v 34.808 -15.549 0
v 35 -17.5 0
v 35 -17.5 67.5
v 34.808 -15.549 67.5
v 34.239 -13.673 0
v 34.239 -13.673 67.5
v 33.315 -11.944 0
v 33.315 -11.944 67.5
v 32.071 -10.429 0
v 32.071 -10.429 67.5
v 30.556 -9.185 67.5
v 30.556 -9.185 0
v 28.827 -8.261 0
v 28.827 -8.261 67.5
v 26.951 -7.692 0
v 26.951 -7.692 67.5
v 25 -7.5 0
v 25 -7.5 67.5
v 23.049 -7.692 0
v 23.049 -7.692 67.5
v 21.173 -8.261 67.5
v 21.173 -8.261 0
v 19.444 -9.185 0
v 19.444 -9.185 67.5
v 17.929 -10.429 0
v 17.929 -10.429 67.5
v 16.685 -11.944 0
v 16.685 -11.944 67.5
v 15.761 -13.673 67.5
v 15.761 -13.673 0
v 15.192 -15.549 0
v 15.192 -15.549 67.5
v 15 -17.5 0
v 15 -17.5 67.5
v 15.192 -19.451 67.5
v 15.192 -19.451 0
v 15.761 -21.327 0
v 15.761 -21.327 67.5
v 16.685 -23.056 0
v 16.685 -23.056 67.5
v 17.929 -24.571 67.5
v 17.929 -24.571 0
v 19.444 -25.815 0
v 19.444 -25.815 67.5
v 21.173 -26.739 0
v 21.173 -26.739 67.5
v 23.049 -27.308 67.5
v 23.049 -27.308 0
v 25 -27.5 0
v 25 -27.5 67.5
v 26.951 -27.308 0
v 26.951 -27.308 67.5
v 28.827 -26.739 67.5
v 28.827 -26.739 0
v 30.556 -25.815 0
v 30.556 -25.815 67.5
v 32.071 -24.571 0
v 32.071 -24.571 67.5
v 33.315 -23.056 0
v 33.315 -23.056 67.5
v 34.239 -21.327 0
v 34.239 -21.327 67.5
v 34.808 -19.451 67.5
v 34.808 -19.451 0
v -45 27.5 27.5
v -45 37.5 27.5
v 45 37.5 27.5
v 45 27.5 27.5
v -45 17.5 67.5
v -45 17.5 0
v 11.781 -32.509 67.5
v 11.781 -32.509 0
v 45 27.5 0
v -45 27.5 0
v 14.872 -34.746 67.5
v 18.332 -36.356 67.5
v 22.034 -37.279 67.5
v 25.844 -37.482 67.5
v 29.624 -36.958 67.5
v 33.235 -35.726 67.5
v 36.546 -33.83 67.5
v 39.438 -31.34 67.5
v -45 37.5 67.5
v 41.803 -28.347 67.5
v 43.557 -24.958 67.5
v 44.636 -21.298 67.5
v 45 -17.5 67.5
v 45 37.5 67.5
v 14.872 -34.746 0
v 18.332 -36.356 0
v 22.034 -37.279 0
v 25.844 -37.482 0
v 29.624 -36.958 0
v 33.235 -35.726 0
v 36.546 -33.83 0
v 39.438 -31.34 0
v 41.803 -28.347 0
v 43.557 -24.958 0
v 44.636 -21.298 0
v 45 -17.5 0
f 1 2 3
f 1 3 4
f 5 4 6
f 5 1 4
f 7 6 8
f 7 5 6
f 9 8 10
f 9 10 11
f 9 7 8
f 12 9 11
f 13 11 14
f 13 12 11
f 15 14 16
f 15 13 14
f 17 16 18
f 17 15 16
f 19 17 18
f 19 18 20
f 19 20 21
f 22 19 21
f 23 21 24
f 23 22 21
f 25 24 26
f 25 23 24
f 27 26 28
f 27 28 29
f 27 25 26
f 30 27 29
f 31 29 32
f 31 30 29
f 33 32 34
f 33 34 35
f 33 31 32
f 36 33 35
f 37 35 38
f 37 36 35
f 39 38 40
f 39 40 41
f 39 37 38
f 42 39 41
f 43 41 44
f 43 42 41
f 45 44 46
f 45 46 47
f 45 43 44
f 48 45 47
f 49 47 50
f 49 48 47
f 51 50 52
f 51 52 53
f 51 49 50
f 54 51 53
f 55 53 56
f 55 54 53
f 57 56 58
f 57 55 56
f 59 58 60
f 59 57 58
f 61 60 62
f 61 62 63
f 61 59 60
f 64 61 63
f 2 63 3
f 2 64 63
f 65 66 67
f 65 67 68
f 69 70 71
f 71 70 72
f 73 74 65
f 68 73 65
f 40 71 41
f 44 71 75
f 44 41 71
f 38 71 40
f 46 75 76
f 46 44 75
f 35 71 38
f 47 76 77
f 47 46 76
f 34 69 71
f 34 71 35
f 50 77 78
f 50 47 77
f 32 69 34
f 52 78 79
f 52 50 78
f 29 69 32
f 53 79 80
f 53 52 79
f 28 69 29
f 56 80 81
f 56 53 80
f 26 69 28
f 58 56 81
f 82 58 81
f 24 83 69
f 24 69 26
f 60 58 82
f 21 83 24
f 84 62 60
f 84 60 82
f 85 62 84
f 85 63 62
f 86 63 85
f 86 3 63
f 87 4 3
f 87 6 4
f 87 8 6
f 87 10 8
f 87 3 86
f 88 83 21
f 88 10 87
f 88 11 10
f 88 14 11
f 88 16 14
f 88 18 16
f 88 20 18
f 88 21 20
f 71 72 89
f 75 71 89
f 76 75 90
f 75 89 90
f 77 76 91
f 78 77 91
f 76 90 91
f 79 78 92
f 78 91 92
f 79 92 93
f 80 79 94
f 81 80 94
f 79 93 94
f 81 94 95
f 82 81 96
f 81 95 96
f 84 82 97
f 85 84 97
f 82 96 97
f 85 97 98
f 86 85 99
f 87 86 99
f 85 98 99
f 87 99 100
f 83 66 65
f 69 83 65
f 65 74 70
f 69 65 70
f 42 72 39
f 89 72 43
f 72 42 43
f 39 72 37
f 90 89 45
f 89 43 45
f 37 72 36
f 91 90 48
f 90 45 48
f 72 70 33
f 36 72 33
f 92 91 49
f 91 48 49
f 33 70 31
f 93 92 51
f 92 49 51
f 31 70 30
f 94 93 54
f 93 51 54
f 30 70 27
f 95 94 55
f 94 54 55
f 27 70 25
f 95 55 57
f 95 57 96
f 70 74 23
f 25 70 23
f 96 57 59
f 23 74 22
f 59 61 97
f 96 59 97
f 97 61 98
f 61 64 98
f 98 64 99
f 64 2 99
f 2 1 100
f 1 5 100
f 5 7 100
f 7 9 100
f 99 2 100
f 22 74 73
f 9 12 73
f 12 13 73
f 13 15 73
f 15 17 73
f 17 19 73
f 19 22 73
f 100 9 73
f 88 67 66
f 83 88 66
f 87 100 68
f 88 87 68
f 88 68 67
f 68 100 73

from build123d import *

# Parameters (mm, degrees)
F0_W     = 37
F0_H     = 10
F0_W_2   = 6
F0_R     = 10
F1_DEPTH = 67.5
F2_W     = 10
F2_H     = 27.5
F3_DEPTH = 250


with BuildPart() as f1:
    # F0 (on Top) → F1 (new body)
    with BuildSketch(Plane.XY):
        Polygon((45, 27.5), (45, 37.5), (-45, 37.5), (-45, 27.5), (-8, 27.5), (-2, 27.5), align=None)
        with Locations((-26.5, 22.5)):
            Rectangle(F0_W, F0_H)
        with Locations((-5, 22.5)):
            Rectangle(F0_W_2, F0_H)
        Polygon((45, 17.5), (45, 27.5), (-2, 27.5), (-2, 17.5), (5, 17.5), align=None)
        with BuildLine():
            Line((45, -17.5), (45, 17.5))
            Line((45, 17.5), (5, 17.5))
            Line((5, 17.5), (5, -17.5))
            ThreePointArc((5, -17.5), (25, 2.5), (45, -17.5))
        make_face()
        with BuildLine():
            Line((-8, 17.5), (-45, 17.5))
            Line((-45, 17.5), (11.781288, -32.508853))
            ThreePointArc((11.781288, -32.508853), (6.773999, -25.734858), (5, -17.5))
            Line((5, -17.5), (5, 17.5))
            Line((5, 17.5), (-2, 17.5))
            Line((-2, 17.5), (-8, 17.5))
        make_face()
        with BuildLine():
            ThreePointArc((11.781288, -32.508853), (33.234858, -35.726001), (45, -17.5))
            ThreePointArc((45, -17.5), (25, 2.5), (5, -17.5))
            ThreePointArc((5, -17.5), (6.773999, -25.734858), (11.781288, -32.508853))
        make_face()
        with Locations((25, -17.5)):
            Circle(F0_R, mode=Mode.SUBTRACT)
    extrude(amount=F1_DEPTH)

    # F2 (on face) → F3 (cut)
    with BuildSketch(Plane(origin=(-45, 0, 0), x_dir=(0, -1, 0), z_dir=(-1, 0, 0))):
        with Locations((-32.5, 13.75)):
            Rectangle(F2_W, F2_H)
    extrude(amount=-F3_DEPTH, mode=Mode.SUBTRACT)


solid = f1.part
